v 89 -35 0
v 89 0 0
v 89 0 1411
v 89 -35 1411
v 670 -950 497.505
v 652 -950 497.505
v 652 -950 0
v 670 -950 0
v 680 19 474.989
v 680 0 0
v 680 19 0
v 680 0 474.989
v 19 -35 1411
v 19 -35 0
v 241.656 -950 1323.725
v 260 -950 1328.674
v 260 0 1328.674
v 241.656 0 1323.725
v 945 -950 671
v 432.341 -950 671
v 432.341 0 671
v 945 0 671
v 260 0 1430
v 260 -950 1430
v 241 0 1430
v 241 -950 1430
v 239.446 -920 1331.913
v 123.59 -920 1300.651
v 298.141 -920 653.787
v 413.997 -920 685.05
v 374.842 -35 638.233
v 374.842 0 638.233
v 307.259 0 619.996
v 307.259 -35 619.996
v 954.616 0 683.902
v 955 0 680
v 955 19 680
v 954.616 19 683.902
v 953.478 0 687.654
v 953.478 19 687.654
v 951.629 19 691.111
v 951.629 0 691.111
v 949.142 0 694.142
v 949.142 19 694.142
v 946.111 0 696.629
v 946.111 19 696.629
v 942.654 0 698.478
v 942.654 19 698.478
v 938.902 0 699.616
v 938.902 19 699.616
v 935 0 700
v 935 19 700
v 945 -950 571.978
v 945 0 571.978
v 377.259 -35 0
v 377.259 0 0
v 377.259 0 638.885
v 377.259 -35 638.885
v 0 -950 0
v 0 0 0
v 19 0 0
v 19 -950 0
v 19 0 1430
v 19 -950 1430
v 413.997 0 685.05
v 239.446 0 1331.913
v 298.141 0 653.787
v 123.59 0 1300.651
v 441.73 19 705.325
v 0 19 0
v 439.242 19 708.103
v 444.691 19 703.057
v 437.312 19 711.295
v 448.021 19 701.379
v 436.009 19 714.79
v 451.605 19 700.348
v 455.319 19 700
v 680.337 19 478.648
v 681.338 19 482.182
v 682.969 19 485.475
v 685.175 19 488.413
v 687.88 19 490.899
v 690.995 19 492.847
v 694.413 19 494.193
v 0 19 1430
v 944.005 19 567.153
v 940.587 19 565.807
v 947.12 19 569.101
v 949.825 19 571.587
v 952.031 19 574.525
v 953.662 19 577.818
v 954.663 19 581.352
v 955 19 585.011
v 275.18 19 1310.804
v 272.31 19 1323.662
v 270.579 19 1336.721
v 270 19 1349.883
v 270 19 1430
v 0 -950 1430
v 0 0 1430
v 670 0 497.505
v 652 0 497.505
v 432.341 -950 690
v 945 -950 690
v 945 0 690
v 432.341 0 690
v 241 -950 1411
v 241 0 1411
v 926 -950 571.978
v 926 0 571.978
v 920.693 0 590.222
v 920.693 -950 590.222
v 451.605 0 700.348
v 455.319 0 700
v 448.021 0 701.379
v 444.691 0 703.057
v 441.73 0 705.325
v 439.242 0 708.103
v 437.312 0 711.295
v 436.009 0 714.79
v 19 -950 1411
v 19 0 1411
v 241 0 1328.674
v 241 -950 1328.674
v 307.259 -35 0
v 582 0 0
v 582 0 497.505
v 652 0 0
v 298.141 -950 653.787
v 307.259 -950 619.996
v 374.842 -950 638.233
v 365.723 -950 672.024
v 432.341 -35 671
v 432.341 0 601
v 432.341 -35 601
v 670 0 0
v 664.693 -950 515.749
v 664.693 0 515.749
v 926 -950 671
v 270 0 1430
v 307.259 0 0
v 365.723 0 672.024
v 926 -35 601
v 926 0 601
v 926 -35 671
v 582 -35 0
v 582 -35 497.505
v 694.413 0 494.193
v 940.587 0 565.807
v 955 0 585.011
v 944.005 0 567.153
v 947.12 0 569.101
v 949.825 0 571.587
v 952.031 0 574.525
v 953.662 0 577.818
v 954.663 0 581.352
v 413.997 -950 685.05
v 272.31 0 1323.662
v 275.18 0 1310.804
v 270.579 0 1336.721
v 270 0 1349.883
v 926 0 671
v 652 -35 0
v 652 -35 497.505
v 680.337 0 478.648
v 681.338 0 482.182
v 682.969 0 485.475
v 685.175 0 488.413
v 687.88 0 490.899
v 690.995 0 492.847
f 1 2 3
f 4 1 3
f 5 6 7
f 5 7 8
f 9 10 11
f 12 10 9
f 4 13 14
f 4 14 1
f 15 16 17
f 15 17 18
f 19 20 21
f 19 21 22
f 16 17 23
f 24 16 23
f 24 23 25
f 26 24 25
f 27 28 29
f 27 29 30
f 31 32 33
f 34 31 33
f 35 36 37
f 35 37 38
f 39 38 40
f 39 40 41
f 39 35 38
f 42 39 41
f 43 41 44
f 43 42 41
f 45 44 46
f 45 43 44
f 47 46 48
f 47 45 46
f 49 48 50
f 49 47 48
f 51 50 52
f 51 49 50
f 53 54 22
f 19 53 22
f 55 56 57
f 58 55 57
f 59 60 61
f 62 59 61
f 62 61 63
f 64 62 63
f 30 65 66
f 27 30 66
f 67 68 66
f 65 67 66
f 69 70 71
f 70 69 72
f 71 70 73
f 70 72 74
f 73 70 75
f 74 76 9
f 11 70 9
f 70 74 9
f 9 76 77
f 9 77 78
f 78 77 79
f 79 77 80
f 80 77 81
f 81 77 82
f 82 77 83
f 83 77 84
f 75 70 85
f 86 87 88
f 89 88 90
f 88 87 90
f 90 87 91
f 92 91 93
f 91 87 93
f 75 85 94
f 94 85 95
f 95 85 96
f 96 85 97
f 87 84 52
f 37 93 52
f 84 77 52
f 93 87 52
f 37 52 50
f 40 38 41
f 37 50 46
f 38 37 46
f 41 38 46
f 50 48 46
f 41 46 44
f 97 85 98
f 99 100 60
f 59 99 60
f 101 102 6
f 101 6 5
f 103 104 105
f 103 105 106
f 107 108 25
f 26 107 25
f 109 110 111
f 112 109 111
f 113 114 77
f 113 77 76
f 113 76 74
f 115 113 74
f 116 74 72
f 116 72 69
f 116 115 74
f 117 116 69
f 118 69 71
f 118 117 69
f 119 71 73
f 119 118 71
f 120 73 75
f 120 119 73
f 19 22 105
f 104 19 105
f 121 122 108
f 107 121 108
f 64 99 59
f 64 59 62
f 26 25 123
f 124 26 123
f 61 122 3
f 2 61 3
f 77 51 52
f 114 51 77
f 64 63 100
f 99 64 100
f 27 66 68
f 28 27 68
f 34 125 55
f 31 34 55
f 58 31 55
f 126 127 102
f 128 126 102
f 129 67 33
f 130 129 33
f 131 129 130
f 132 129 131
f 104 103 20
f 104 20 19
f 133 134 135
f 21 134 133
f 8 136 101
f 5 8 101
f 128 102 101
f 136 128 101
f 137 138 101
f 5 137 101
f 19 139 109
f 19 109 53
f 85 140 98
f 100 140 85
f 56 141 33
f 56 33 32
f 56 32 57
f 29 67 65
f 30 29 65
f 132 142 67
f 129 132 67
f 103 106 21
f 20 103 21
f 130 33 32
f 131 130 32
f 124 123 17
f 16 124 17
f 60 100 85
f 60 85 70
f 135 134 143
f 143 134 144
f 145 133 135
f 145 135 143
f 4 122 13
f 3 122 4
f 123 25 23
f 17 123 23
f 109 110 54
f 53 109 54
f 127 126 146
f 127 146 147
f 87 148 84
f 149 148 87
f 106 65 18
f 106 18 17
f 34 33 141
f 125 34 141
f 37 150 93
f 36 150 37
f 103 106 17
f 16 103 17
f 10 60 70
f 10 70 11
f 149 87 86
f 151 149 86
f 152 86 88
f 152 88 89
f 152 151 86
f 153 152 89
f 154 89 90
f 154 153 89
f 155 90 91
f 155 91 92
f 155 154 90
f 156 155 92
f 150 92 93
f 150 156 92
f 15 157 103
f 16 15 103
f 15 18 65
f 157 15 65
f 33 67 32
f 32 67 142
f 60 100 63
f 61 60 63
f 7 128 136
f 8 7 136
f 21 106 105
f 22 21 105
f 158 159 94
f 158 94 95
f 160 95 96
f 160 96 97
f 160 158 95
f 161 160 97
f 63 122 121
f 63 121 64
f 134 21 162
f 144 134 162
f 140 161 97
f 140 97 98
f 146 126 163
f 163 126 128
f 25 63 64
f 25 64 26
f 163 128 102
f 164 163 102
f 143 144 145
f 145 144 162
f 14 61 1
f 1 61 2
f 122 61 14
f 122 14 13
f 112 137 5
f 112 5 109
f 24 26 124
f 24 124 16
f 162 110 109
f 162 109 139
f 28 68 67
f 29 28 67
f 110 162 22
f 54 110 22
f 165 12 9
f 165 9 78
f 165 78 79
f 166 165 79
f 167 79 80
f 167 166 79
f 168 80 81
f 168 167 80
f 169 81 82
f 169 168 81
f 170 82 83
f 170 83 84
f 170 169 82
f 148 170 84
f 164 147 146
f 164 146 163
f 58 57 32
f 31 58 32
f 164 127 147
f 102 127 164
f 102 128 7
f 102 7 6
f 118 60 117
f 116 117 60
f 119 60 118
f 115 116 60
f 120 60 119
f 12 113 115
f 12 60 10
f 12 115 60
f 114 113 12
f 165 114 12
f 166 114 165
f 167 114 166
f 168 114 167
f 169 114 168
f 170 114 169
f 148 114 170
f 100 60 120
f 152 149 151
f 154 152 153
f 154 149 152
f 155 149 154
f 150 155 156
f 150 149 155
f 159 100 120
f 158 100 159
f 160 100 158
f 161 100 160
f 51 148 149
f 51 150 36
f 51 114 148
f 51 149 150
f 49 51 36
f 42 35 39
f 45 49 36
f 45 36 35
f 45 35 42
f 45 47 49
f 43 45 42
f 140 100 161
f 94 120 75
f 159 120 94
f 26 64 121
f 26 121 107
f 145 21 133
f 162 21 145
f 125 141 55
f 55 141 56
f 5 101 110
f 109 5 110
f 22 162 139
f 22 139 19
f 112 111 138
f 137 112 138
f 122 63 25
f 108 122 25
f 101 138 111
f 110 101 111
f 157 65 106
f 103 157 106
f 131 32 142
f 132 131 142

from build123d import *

# Parameters (mm, degrees)
F0_W     = 18
F0_H     = 497.5054570848
F0_W_2   = 222
F0_H_2   = 19
F0_W_3   = 19
F0_H_3   = 99.0218156425
F1_DEPTH = 19
F2_DEPTH = 950
F3_DEPTH = 950
F5_DEPTH = 920
F6_W     = 70
F6_H     = 1411
F7_DEPTH = 35
F6_H_2   = 497.5054570848
F6_W_2   = 493.6592622864
F6_H_3   = 70
F8_DEPTH = 950


with BuildPart() as f1:
    # F0 (on Front) → F1 (new body)
    with BuildSketch(Plane.XZ):
        Polygon((432.3407377136, 690), (260, 1328.6744985857), (241.6561148831, 1323.7245613319), (413.9968525967, 685.0500627462), align=None)
        Polygon((945, 690), (432.3407377136, 690), (432.3407377136, 671), (926, 671), (945, 671), align=None)
        Polygon((664.6927387242, 515.7491677203), (670, 497.5054570848), (926, 571.9781843575), (920.6927387242, 590.221894993), align=None)
        with Locations((661, 248.7527285424)):
            Rectangle(F0_W, F0_H)
        Polygon((0, 1430), (0, 0), (19, 0), (19, 1411), (19, 1430), align=None)
        with Locations((130, 1420.5)):
            Rectangle(F0_W_2, F0_H_2)
        Polygon((260, 1430), (241, 1430), (241, 1411), (241, 1328.6744985857), (260, 1328.6744985857), align=None)
        with BuildLine():
            Line((670, 497.5054570848), (670, 0))
            Line((670, 0), (680, 0))
            Line((680, 0), (680, 474.9890858304))
            ThreePointArc((680, 474.9890858304), (684.0041909187, 486.99467169), (694.4134091834, 494.1929917624))
            Line((694.4134091834, 494.1929917624), (940.5865908166, 565.8070082376))
            ThreePointArc((940.5865908166, 565.8070082376), (950.9958090813, 573.00532831), (955, 585.0109141696))
            Line((955, 585.0109141696), (955, 680))
            ThreePointArc((955, 680), (949.1421356237, 694.1421356237), (935, 700))
            Line((935, 700), (455.3185245728, 700))
            ThreePointArc((455.3185245728, 700), (443.1572994154, 704.122197801), (436.0091718181, 714.7895397329))
            Line((436.0091718181, 714.7895397329), (275.1798543399, 1310.8040692109))
            ThreePointArc((275.1798543399, 1310.8040692109), (271.300602138, 1330.1723949973), (270, 1349.8825212144))
            Line((270, 1349.8825212144), (270, 1430))
            Line((270, 1430), (260, 1430))
            Line((260, 1430), (260, 1328.6744985857))
            Line((260, 1328.6744985857), (432.3407377136, 690))
            Line((432.3407377136, 690), (945, 690))
            Line((945, 690), (945, 671))
            Line((945, 671), (945, 571.9781843575))
            Line((945, 571.9781843575), (926, 571.9781843575))
            Line((926, 571.9781843575), (670, 497.5054570848))
        make_face()
        with Locations((935.5, 621.4890921788)):
            Rectangle(F0_W_3, F0_H_3)
        Polygon((19, 1411), (19, 0), (652, 0), (652, 497.5054570848), (670, 497.5054570848), (664.6927387242, 515.7491677203), (920.6927387242, 590.221894993), (926, 571.9781843575), (926, 671), (432.3407377136, 671), (432.3407377136, 690), (413.9968525967, 685.0500627462), (241.6561148831, 1323.7245613319), (260, 1328.6744985857), (241, 1328.6744985857), (241, 1411), align=None)
    extrude(amount=-F1_DEPTH)


with BuildPart() as f2:
    # F0 (on Front) → F2 (new body)
    with BuildSketch(Plane.XZ):
        Polygon((0, 1430), (0, 0), (19, 0), (19, 1411), (19, 1430), align=None)
    extrude(amount=F2_DEPTH)


with BuildPart() as f2b:
    # F0 (on Front) → F2, piece 2 (new body)
    with BuildSketch(Plane.XZ):
        with Locations((661, 248.7527285424)):
            Rectangle(F0_W, F0_H)
    extrude(amount=F2_DEPTH)


with BuildPart() as f2c:
    # F0 (on Front) → F2, piece 3 (new body)
    with BuildSketch(Plane.XZ):
        Polygon((664.6927387242, 515.7491677203), (670, 497.5054570848), (926, 571.9781843575), (920.6927387242, 590.221894993), align=None)
    extrude(amount=F2_DEPTH)


with BuildPart() as f2d:
    # F0 (on Front) → F2, piece 4 (new body)
    with BuildSketch(Plane.XZ):
        Polygon((945, 690), (432.3407377136, 690), (432.3407377136, 671), (926, 671), (945, 671), align=None)
    extrude(amount=F2_DEPTH)


with BuildPart() as f2e:
    # F0 (on Front) → F2, piece 5 (new body)
    with BuildSketch(Plane.XZ):
        Polygon((432.3407377136, 690), (260, 1328.6744985857), (241.6561148831, 1323.7245613319), (413.9968525967, 685.0500627462), align=None)
    extrude(amount=F2_DEPTH)


with BuildPart() as f2f:
    # F0 (on Front) → F2, piece 6 (new body)
    with BuildSketch(Plane.XZ):
        Polygon((260, 1430), (241, 1430), (241, 1411), (241, 1328.6744985857), (260, 1328.6744985857), align=None)
    extrude(amount=F2_DEPTH)


with BuildPart() as f3:
    # F0 (on Front) → F3 (new body)
    with BuildSketch(Plane.XZ):
        with Locations((935.5, 621.4890921788)):
            Rectangle(F0_W_3, F0_H_3)
    extrude(amount=F3_DEPTH)


with BuildPart() as f3b:
    # F0 (on Front) → F3, piece 2 (new body)
    with BuildSketch(Plane.XZ):
        with Locations((130, 1420.5)):
            Rectangle(F0_W_2, F0_H_2)
    extrude(amount=F3_DEPTH)


with BuildPart() as f5:
    # F4 (on Front) → F5 (new body)
    with BuildSketch(Plane.XZ):
        Polygon((413.9968525967, 685.0500627462), (239.4464336476, 1331.9133800279), (123.5903171196, 1300.6506184251), (298.1407360686, 653.7873011434), align=None)
    extrude(amount=F5_DEPTH)


with BuildPart() as f7:
    # F6 (on Front) → F7 (new body)
    with BuildSketch(Plane.XZ):
        with Locations((54, 705.5)):
            Rectangle(F6_W, F6_H)
    extrude(amount=F7_DEPTH)


with BuildPart() as f7b:
    # F6 (on Front) → F7, piece 2 (new body)
    with BuildSketch(Plane.XZ):
        Polygon((374.8417761774, 638.2325447577), (307.2590415361, 619.9959338227), (307.2590415361, 0), (377.2590415361, 0), (377.2590415361, 638.8848227116), align=None)
    extrude(amount=F7_DEPTH)


with BuildPart() as f7c:
    # F6 (on Front) → F7, piece 3 (new body)
    with BuildSketch(Plane.XZ):
        with Locations((617, 248.7527285424)):
            Rectangle(F6_W, F6_H_2)
    extrude(amount=F7_DEPTH)


with BuildPart() as f7d:
    # F6 (on Front) → F7, piece 4 (new body)
    with BuildSketch(Plane.XZ):
        with Locations((679.1703688568, 636)):
            Rectangle(F6_W_2, F6_H_3)
    extrude(amount=F7_DEPTH)


with BuildPart() as f8:
    # F6 (on Front) → F8 (new body)
    with BuildSketch(Plane.XZ):
        Polygon((365.72347071, 672.0239120784), (298.1407360686, 653.7873011434), (307.2590415361, 619.9959338227), (374.8417761774, 638.2325447577), align=None)
    extrude(amount=F8_DEPTH)


solid = Compound([f1.part, f2.part, f2b.part, f2c.part, f2d.part, f2e.part, f2f.part, f3.part, f3b.part, f5.part, f7.part, f7b.part, f7c.part, f7d.part, f8.part])
